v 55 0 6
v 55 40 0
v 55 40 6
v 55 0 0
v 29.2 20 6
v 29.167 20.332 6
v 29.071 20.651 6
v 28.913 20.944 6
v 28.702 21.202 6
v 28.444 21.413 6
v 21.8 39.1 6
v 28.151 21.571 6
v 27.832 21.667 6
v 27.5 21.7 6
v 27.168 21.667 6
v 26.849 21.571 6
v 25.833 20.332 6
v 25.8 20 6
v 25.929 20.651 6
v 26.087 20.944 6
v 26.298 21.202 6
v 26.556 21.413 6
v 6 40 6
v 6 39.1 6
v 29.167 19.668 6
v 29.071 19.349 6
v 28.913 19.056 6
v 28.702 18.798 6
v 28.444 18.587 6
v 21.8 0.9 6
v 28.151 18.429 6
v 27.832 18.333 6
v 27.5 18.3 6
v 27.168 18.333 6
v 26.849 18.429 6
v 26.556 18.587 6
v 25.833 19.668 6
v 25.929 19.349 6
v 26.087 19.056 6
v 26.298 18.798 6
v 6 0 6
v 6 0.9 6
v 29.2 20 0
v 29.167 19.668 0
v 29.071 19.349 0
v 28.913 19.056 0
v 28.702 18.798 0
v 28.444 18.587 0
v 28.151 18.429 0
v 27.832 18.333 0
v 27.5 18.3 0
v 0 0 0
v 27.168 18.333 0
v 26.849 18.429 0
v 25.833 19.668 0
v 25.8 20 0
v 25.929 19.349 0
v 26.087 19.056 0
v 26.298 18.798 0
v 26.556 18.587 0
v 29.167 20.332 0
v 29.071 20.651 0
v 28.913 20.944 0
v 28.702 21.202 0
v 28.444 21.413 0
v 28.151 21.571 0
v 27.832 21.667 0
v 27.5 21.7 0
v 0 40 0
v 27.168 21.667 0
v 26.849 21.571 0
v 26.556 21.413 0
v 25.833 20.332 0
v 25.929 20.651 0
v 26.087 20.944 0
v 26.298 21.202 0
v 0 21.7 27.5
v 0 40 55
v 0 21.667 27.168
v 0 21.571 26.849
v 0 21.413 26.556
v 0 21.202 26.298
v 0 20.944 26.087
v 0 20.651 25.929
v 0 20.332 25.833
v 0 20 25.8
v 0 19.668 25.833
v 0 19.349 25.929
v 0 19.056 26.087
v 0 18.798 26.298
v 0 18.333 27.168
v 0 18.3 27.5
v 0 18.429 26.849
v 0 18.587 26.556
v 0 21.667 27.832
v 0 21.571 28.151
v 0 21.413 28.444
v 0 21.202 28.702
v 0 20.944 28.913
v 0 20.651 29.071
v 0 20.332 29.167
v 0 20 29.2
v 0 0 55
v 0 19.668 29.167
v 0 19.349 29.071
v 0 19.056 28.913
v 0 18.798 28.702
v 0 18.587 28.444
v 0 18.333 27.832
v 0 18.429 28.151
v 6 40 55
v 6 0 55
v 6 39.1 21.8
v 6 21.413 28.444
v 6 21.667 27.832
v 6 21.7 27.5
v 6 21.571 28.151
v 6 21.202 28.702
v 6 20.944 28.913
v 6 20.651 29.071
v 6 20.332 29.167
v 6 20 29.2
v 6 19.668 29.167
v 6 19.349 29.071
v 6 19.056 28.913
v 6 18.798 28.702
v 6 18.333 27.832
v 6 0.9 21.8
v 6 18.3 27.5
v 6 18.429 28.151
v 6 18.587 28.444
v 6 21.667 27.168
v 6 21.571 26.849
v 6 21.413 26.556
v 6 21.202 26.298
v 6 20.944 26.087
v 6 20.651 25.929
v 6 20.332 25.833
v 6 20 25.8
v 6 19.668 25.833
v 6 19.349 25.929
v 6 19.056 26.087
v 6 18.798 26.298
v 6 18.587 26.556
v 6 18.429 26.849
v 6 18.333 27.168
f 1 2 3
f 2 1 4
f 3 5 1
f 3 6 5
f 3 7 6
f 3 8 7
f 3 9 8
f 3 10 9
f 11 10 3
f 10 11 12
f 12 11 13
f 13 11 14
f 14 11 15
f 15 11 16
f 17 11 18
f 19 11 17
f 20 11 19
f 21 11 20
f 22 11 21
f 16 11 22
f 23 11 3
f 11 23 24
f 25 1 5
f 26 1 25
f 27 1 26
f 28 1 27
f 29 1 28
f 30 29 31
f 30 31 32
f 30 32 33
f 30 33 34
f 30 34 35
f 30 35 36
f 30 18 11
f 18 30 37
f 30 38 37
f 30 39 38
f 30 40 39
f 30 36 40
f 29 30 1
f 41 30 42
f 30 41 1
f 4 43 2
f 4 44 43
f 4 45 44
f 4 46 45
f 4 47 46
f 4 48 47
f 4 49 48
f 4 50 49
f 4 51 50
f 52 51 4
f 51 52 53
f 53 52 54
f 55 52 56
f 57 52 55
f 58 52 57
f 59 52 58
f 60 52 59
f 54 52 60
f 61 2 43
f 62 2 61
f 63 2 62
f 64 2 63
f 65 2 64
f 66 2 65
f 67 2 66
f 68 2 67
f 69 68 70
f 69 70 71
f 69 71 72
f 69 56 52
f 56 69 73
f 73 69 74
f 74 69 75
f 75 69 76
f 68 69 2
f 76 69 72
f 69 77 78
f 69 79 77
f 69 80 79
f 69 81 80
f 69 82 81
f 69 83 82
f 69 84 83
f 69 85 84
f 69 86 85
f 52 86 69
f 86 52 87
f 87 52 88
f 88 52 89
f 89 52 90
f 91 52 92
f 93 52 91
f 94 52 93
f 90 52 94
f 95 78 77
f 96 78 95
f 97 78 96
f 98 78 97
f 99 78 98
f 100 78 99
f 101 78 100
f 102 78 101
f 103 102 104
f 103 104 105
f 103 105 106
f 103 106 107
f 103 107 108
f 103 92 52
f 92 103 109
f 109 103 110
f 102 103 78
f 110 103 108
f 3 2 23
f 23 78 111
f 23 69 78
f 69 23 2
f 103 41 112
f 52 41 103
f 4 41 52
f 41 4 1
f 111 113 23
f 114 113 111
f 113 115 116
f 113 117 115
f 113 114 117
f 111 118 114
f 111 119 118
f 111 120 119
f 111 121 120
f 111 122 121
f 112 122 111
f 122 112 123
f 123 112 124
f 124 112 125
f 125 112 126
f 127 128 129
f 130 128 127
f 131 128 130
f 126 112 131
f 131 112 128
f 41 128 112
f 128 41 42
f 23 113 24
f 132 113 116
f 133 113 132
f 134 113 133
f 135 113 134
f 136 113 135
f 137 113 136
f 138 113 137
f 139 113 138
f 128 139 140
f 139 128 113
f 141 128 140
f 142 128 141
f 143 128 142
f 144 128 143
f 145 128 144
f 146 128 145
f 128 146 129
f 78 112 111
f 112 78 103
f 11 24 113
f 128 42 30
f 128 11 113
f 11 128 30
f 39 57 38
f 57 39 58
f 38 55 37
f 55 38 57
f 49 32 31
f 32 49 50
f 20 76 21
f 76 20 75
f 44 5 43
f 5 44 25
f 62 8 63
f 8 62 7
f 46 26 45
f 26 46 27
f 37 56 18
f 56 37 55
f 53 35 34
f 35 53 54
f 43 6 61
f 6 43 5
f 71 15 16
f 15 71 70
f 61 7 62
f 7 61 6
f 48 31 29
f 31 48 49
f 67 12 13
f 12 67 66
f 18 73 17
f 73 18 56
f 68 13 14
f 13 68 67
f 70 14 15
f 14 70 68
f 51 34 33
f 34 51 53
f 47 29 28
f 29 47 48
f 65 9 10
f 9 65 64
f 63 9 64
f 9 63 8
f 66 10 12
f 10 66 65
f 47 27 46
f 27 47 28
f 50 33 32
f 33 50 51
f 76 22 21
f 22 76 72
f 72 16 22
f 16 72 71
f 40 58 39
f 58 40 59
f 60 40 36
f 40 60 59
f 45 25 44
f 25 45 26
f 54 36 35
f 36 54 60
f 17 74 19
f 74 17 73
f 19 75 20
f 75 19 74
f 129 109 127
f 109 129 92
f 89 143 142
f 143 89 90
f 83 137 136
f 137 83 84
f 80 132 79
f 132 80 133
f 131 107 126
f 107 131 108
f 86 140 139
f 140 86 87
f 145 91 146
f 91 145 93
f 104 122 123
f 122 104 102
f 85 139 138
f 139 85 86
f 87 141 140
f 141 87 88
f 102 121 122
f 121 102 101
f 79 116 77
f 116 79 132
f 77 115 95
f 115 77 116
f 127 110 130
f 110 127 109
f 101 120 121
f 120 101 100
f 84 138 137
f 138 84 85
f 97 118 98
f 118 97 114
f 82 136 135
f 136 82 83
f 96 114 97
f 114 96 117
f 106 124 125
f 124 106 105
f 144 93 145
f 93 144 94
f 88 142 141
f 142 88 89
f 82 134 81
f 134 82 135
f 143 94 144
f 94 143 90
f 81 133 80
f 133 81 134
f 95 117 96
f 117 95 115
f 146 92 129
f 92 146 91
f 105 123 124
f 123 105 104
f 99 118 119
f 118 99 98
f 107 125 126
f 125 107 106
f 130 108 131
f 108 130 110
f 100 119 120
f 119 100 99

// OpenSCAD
$fn = 32;

// ----------------------------------------------------------------------
// L-bracket: 55 x 40 x 55 mm
// ----------------------------------------------------------------------

// --- parameters (mm) ---
run_out = 55;             // horizontal leg, X
rise = 55;                // vertical leg, Z
bracket_w = 40;           // bracket depth, Y
sheet_t = 6;              // plate thickness
hole_d = 3.4;             // clearance for M3
rib_leg = 26.9;           // gusset leg
rib_sink = 0.9;           // gusset overlap into the plates

module hole_z(px, py) {
  translate([px, py, -0.5]) cylinder(h = sheet_t + 1, d = hole_d);
}
module hole_x(pz, py) {
  translate([-0.5, py, pz]) rotate([0, 90, 0]) cylinder(h = sheet_t + 1, d = hole_d);
}
module gusset() {
  translate([0, bracket_w - rib_sink, 0])
    rotate([90, 0, 0])
      linear_extrude(height = bracket_w - 2 * rib_sink)
        polygon(points = [[rib_sink, rib_sink], [rib_leg, rib_sink], [rib_sink, rib_leg]]);
}

difference() {
  union() {
    /* horizontal leg */
    cube([run_out, bracket_w, sheet_t]);
    /* vertical leg, overlapping the corner block */
    cube([sheet_t, bracket_w, rise]);
    gusset();
  }
  hole_z(27.5, 20);
  hole_x(27.5, 20);
}
